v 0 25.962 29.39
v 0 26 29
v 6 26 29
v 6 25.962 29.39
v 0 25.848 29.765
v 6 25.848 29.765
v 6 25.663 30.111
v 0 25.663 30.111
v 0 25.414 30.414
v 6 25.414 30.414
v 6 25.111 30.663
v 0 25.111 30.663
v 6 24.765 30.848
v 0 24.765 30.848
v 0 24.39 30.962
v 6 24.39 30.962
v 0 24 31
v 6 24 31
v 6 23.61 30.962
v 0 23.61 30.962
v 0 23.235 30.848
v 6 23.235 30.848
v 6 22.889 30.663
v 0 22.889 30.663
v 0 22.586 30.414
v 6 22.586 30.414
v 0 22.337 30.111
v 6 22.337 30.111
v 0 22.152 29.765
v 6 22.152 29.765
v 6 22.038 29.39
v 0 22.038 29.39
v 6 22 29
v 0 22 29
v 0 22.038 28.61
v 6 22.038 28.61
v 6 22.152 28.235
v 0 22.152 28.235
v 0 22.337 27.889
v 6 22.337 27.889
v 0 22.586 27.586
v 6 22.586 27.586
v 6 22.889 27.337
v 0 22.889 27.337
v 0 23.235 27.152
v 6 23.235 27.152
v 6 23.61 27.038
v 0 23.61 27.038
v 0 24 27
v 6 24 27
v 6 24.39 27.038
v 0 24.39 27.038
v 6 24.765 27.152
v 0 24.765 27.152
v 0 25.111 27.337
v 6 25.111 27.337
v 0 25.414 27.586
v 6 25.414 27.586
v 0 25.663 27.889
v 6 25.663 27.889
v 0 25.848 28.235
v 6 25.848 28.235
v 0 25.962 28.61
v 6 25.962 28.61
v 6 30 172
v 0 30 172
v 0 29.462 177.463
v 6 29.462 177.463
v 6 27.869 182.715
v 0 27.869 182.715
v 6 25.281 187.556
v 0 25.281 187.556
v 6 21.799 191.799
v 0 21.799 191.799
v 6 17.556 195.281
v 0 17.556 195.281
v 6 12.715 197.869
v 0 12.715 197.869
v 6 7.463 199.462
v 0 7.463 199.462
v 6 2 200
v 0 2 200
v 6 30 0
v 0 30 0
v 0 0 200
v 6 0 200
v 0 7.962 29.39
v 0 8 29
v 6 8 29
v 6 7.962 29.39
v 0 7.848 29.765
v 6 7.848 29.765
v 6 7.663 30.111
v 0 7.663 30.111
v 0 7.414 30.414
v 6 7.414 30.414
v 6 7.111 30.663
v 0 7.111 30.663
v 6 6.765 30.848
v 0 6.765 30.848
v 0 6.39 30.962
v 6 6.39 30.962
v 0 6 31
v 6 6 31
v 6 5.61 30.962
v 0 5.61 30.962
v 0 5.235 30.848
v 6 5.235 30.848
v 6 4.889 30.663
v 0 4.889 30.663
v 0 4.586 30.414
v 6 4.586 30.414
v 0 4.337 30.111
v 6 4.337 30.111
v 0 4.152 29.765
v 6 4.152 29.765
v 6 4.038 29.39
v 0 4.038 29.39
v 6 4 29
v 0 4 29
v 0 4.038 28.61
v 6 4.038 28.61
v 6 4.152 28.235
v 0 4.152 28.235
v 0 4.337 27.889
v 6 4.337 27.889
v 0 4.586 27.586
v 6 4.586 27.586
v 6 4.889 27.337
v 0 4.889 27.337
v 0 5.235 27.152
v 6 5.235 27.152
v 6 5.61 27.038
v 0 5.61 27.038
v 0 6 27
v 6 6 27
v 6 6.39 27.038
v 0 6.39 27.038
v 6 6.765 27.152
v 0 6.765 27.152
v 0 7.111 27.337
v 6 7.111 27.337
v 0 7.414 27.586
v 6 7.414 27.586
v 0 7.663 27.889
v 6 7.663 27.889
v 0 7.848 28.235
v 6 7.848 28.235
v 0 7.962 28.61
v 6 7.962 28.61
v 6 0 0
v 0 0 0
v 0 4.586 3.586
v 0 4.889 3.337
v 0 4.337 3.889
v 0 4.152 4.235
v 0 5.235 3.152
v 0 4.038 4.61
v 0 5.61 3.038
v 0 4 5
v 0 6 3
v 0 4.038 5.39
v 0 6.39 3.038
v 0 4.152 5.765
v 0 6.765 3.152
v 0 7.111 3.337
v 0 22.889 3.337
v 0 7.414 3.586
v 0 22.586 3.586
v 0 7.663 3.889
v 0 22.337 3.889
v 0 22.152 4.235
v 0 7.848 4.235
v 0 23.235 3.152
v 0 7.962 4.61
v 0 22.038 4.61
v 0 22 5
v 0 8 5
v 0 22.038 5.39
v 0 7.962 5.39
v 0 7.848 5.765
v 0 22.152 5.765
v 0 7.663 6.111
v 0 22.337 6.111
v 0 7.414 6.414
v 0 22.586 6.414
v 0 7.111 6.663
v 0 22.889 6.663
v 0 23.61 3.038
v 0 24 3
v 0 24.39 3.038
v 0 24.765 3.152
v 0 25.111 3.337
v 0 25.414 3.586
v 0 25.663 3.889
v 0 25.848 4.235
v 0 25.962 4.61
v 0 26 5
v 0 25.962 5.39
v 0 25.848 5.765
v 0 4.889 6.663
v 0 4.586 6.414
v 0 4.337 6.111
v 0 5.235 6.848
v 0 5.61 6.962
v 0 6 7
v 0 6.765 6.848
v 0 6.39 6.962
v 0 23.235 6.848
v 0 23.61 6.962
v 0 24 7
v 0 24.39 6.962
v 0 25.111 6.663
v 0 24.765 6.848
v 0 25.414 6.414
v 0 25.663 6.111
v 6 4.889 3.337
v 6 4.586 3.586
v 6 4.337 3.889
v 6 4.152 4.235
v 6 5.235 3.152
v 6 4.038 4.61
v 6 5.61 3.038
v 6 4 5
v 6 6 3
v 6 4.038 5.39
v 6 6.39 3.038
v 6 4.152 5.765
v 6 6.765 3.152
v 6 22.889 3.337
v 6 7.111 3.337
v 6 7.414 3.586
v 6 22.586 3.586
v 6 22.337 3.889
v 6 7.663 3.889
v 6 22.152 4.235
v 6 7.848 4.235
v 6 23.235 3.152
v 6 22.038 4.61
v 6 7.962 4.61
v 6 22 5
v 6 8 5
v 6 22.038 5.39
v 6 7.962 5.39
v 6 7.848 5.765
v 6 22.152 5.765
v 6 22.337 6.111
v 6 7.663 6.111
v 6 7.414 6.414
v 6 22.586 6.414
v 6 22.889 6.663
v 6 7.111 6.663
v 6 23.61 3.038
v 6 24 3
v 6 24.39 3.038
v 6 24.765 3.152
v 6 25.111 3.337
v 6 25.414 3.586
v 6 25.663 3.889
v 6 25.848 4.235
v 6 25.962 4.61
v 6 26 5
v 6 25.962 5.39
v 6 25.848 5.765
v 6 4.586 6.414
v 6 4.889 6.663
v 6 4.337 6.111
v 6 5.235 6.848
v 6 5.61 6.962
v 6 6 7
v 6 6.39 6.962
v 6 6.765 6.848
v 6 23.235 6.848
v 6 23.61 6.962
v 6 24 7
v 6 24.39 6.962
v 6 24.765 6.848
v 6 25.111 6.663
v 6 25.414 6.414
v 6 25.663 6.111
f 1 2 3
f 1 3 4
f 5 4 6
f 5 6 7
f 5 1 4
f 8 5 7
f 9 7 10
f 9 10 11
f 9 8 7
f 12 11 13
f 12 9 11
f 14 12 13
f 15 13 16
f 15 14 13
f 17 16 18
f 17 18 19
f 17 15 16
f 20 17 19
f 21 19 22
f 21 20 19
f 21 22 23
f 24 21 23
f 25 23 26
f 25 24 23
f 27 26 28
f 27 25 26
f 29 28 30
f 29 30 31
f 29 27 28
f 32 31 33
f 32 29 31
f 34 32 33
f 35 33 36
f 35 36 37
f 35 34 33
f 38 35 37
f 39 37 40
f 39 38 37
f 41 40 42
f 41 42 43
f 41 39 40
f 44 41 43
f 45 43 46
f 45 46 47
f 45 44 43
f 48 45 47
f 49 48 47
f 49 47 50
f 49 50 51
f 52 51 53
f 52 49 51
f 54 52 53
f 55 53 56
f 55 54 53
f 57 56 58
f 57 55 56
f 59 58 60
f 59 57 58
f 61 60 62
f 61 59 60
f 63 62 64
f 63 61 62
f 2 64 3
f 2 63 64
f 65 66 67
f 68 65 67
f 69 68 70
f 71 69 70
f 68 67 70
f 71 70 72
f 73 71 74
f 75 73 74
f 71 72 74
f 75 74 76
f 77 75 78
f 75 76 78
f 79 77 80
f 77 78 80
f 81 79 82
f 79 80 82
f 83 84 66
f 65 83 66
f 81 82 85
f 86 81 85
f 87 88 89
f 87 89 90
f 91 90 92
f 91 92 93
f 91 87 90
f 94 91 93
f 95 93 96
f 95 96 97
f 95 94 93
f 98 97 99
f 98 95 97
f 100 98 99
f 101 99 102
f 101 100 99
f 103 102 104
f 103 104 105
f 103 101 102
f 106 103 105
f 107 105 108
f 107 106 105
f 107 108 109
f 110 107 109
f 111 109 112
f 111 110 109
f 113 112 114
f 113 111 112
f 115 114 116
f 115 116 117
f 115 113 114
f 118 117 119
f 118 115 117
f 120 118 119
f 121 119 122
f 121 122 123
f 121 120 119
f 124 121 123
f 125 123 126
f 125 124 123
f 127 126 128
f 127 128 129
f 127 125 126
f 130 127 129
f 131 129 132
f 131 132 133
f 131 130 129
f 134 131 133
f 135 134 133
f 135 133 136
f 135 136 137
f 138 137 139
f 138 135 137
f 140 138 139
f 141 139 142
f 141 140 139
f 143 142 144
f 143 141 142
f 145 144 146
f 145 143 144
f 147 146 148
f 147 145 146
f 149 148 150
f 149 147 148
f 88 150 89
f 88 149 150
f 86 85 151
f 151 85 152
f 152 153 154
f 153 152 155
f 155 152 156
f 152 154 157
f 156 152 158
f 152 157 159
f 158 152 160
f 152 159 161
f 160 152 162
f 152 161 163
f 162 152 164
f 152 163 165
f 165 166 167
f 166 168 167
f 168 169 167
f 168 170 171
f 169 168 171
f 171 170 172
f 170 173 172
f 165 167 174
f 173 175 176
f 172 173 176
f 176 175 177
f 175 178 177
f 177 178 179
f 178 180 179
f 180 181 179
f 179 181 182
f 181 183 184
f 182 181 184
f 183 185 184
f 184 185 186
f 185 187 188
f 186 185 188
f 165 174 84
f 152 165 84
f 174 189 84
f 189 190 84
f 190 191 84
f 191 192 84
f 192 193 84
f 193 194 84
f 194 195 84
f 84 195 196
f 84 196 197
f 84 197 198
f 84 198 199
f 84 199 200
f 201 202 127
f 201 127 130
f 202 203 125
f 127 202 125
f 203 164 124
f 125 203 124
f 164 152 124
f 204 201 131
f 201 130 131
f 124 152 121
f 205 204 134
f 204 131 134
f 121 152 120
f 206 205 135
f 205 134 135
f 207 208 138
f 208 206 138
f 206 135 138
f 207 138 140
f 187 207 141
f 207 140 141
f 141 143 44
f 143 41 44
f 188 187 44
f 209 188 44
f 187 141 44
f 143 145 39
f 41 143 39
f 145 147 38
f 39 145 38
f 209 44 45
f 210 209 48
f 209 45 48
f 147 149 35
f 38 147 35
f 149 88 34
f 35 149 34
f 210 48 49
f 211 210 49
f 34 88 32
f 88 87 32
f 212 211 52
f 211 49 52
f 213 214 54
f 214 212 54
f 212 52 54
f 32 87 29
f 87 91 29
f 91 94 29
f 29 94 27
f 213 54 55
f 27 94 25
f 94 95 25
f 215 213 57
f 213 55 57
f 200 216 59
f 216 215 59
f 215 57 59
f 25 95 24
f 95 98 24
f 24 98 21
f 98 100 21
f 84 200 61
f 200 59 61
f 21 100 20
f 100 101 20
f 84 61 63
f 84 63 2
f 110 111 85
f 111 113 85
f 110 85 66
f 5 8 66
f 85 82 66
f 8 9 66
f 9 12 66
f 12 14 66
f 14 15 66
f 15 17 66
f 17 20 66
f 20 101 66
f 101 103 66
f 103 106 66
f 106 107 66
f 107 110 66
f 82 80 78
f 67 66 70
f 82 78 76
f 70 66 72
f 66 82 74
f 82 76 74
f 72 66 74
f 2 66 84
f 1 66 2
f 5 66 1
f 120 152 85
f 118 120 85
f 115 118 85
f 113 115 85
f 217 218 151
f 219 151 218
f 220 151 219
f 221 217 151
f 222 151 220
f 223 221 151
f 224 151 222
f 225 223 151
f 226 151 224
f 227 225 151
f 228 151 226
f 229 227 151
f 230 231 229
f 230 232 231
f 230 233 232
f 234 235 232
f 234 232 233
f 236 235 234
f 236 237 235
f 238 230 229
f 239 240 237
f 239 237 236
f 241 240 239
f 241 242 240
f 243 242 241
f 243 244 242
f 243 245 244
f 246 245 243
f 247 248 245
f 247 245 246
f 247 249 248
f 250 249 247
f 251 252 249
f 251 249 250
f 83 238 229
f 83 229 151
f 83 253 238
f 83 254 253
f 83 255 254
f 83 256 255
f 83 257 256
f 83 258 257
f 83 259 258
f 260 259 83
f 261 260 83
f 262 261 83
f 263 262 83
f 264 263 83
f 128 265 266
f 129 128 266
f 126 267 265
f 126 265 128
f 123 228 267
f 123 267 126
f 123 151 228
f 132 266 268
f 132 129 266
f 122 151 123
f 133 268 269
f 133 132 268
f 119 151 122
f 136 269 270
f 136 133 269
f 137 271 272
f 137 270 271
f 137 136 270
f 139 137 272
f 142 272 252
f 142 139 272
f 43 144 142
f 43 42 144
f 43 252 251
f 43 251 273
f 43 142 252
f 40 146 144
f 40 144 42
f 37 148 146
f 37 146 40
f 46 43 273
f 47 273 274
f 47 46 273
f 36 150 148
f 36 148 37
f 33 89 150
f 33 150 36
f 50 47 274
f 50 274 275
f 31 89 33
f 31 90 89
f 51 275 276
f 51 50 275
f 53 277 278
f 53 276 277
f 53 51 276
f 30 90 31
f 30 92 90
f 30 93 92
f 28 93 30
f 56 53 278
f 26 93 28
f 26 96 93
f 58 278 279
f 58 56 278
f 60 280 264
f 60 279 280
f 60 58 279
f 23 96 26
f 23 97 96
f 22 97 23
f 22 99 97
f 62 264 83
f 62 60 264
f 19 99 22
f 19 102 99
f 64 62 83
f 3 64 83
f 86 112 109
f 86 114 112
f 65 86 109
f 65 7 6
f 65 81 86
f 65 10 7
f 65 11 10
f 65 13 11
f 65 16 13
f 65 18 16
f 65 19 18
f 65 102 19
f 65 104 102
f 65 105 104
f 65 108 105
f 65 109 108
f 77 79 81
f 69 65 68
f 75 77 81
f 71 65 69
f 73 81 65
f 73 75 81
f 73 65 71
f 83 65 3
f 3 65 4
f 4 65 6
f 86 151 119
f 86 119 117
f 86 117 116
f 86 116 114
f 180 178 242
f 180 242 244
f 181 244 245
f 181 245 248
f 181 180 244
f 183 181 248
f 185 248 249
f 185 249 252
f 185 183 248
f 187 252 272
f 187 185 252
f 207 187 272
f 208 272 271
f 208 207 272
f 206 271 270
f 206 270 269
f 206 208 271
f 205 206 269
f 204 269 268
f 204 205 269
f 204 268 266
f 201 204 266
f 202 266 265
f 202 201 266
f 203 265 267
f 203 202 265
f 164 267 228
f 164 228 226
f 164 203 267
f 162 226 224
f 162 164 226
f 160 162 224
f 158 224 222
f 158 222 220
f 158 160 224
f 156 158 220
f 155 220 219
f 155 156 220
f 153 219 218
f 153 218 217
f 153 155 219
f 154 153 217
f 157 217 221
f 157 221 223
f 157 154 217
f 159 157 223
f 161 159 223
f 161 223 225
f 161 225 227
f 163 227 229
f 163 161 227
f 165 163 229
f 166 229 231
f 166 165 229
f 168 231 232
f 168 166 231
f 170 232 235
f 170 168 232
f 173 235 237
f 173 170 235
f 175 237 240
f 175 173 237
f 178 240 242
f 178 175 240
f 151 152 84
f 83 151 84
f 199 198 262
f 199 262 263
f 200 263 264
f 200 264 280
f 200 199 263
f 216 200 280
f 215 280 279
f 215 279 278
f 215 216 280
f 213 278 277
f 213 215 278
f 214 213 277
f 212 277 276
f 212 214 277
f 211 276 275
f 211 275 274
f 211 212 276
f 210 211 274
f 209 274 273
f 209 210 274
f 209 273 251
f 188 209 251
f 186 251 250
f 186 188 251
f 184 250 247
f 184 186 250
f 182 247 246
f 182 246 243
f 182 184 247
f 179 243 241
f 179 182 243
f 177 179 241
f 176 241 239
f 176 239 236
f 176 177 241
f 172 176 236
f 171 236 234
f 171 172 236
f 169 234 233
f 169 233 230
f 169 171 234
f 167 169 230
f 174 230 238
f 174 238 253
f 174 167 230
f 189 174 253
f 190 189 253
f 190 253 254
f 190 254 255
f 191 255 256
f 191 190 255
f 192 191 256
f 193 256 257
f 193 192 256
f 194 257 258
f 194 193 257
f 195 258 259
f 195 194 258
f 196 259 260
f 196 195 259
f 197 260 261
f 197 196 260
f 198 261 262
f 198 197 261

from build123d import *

# Parameters (mm, degrees)
SKETCH_R  = 2
PAD_DEPTH = 6


with BuildPart() as part:
    # Sketch → Pad (new body)
    with BuildSketch(Plane.YZ):
        with BuildLine():
            Line((0, 0), (30, 0))
            Line((30, 0), (30, 172))
            ThreePointArc((30, 172), (21.79899, 191.79899), (2, 200))
            Line((2, 200), (0, 200))
            Line((0, 200), (0, 0))
        make_face()
        with Locations((6, 29)):
            Circle(SKETCH_R, mode=Mode.SUBTRACT)
        with Locations((24, 29)):
            Circle(SKETCH_R, mode=Mode.SUBTRACT)
        with Locations((6, 5)):
            Circle(SKETCH_R, mode=Mode.SUBTRACT)
        with Locations((24, 5)):
            Circle(SKETCH_R, mode=Mode.SUBTRACT)
    extrude(amount=PAD_DEPTH)


solid = part.part
